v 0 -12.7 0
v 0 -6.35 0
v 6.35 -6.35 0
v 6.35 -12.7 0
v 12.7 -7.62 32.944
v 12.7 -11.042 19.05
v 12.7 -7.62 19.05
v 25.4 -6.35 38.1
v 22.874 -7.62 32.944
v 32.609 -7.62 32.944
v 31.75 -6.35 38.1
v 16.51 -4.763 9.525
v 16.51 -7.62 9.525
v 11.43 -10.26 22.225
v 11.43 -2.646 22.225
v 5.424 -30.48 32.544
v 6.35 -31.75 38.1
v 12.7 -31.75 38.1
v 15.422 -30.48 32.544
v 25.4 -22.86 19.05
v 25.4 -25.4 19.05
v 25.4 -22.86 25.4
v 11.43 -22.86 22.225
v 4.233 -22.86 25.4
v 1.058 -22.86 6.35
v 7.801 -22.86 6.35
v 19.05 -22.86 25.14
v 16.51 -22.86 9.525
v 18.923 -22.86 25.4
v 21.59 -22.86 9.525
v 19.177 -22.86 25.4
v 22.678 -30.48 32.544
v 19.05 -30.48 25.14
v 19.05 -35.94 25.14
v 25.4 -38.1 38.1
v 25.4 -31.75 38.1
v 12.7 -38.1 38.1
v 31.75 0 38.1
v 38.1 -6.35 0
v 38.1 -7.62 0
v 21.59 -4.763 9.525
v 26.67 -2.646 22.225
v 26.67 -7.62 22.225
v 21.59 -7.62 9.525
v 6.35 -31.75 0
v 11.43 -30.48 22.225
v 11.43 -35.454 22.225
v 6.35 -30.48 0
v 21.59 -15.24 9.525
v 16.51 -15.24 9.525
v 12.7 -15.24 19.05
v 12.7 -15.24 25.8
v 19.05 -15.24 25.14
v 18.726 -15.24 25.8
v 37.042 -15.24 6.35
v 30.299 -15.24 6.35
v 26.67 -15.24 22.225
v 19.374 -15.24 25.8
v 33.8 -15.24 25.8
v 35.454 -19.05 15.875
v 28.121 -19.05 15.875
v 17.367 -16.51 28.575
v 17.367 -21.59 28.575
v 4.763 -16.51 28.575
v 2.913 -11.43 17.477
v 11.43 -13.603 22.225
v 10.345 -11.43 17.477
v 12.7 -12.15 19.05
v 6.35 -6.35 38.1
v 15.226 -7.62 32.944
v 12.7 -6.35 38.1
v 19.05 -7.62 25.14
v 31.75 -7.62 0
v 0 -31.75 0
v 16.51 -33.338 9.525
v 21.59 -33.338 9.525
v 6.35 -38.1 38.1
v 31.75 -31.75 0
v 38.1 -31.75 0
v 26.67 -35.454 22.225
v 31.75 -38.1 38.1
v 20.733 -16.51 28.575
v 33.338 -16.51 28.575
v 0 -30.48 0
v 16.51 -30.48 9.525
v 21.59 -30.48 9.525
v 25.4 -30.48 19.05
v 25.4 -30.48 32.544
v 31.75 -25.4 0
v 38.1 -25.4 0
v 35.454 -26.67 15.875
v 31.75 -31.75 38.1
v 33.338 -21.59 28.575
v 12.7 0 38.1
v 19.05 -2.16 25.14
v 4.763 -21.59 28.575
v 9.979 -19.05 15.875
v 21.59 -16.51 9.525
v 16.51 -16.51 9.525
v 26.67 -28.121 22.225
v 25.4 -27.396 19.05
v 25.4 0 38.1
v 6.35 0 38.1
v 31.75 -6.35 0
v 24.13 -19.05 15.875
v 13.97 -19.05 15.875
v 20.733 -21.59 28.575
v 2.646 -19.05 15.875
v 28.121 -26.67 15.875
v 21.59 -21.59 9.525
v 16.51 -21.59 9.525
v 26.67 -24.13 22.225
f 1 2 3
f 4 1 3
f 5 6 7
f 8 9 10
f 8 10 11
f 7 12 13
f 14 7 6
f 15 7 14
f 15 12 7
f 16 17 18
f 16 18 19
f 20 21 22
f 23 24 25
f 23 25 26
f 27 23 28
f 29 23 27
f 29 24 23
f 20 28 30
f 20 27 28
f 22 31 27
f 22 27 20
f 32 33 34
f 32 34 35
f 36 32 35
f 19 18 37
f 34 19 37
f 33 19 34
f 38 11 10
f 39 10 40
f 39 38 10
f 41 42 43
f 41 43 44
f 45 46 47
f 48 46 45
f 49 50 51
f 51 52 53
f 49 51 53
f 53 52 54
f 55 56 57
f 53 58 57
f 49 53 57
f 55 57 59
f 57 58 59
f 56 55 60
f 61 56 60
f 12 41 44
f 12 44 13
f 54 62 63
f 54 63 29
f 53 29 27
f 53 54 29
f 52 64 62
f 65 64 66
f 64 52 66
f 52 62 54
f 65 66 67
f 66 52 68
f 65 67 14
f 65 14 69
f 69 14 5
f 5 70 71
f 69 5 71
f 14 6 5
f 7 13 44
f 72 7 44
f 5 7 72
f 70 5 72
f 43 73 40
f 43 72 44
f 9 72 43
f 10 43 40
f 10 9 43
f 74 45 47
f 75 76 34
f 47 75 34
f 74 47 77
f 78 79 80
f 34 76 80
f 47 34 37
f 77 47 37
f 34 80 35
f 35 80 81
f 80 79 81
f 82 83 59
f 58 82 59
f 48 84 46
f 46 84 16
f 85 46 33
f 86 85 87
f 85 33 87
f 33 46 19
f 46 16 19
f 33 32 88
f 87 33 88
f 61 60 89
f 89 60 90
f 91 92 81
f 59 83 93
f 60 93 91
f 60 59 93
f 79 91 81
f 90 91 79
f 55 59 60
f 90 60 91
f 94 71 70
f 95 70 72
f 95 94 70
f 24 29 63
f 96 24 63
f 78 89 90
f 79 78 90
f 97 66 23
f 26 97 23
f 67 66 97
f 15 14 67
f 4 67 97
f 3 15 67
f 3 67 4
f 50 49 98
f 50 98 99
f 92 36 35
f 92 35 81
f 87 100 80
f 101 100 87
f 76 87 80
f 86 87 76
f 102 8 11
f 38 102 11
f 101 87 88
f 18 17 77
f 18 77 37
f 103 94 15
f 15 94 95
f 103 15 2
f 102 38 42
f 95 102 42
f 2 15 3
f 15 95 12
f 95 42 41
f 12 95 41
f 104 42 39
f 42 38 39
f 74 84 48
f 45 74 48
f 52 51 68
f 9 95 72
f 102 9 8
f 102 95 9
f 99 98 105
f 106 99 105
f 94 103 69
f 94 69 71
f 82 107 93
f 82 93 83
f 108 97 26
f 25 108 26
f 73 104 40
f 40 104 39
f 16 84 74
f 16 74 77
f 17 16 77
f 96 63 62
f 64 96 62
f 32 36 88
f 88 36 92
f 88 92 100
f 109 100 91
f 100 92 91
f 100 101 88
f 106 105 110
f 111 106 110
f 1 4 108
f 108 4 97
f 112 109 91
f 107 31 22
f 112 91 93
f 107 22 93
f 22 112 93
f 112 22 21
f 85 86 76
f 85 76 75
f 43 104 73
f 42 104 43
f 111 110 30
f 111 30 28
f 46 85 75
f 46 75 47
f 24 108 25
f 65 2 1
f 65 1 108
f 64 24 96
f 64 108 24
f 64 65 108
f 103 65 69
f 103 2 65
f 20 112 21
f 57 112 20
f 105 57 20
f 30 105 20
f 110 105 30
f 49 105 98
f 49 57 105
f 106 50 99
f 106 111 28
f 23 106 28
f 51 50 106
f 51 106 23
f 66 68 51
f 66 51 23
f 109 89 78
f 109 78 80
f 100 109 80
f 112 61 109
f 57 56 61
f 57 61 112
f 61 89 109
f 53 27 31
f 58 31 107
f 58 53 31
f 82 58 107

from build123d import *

# Parameters (mm, degrees)
F0_W     = 38.1
F0_H     = 38.1
F1_DEPTH = 38.1
F5_DEPTH = 38.1
F7_DEPTH = 38.1
F8_W     = 25.4
F8_H     = 7.62
F9_DEPTH = 38.1


with BuildPart() as f1:
    # F0 (on Front) → F1 (new body)
    with BuildSketch(Plane.XZ):
        with Locations((19.05, 19.05)):
            Rectangle(F0_W, F0_H)
    extrude(amount=F1_DEPTH)

    # F4 (on offset) → F5 (cut)
    with BuildSketch(Plane.YZ.offset(38.1)):
        Polygon((-6.35, 0), (0, 0), (0, 38.1), align=None)
        Polygon((-11.43, 17.476514), (-6.35, 38.1), (-31.75, 38.1), (-26.67, 15.875), (-21.59, 28.575), (-16.51, 28.575), align=None)
        Polygon((-31.75, 0), (-38.1, 38.1), (-38.1, 0), align=None)
        Polygon((-25.4, 0), (-12.7, 0), (-19.05, 15.875), align=None)
    extrude(amount=-F5_DEPTH, mode=Mode.SUBTRACT)

    # F6 (on Front) → F7 (cut)
    with BuildSketch(Plane.XZ):
        Polygon((11.43, 22.225), (6.35, 0), (31.75, 0), (26.67, 22.225), (21.59, 9.525), (16.51, 9.525), align=None)
        Polygon((31.75, 38.1), (38.1, 0), (38.1, 38.1), align=None)
        Polygon((25.4, 38.1), (12.7, 38.1), (19.05, 25.139847), align=None)
        Polygon((6.35, 38.1), (0, 38.1), (0, 0), align=None)
    extrude(amount=F7_DEPTH, mode=Mode.SUBTRACT)

    # F8 (on offset) → F9 (cut)
    with BuildSketch(Plane.XY.offset(38.1)):
        with Locations((25.4, -11.43)):
            Rectangle(F8_W, F8_H)
        with Locations((12.7, -26.67)):
            Rectangle(F8_W, F8_H)
    extrude(amount=-F9_DEPTH, mode=Mode.SUBTRACT)


solid = f1.part
